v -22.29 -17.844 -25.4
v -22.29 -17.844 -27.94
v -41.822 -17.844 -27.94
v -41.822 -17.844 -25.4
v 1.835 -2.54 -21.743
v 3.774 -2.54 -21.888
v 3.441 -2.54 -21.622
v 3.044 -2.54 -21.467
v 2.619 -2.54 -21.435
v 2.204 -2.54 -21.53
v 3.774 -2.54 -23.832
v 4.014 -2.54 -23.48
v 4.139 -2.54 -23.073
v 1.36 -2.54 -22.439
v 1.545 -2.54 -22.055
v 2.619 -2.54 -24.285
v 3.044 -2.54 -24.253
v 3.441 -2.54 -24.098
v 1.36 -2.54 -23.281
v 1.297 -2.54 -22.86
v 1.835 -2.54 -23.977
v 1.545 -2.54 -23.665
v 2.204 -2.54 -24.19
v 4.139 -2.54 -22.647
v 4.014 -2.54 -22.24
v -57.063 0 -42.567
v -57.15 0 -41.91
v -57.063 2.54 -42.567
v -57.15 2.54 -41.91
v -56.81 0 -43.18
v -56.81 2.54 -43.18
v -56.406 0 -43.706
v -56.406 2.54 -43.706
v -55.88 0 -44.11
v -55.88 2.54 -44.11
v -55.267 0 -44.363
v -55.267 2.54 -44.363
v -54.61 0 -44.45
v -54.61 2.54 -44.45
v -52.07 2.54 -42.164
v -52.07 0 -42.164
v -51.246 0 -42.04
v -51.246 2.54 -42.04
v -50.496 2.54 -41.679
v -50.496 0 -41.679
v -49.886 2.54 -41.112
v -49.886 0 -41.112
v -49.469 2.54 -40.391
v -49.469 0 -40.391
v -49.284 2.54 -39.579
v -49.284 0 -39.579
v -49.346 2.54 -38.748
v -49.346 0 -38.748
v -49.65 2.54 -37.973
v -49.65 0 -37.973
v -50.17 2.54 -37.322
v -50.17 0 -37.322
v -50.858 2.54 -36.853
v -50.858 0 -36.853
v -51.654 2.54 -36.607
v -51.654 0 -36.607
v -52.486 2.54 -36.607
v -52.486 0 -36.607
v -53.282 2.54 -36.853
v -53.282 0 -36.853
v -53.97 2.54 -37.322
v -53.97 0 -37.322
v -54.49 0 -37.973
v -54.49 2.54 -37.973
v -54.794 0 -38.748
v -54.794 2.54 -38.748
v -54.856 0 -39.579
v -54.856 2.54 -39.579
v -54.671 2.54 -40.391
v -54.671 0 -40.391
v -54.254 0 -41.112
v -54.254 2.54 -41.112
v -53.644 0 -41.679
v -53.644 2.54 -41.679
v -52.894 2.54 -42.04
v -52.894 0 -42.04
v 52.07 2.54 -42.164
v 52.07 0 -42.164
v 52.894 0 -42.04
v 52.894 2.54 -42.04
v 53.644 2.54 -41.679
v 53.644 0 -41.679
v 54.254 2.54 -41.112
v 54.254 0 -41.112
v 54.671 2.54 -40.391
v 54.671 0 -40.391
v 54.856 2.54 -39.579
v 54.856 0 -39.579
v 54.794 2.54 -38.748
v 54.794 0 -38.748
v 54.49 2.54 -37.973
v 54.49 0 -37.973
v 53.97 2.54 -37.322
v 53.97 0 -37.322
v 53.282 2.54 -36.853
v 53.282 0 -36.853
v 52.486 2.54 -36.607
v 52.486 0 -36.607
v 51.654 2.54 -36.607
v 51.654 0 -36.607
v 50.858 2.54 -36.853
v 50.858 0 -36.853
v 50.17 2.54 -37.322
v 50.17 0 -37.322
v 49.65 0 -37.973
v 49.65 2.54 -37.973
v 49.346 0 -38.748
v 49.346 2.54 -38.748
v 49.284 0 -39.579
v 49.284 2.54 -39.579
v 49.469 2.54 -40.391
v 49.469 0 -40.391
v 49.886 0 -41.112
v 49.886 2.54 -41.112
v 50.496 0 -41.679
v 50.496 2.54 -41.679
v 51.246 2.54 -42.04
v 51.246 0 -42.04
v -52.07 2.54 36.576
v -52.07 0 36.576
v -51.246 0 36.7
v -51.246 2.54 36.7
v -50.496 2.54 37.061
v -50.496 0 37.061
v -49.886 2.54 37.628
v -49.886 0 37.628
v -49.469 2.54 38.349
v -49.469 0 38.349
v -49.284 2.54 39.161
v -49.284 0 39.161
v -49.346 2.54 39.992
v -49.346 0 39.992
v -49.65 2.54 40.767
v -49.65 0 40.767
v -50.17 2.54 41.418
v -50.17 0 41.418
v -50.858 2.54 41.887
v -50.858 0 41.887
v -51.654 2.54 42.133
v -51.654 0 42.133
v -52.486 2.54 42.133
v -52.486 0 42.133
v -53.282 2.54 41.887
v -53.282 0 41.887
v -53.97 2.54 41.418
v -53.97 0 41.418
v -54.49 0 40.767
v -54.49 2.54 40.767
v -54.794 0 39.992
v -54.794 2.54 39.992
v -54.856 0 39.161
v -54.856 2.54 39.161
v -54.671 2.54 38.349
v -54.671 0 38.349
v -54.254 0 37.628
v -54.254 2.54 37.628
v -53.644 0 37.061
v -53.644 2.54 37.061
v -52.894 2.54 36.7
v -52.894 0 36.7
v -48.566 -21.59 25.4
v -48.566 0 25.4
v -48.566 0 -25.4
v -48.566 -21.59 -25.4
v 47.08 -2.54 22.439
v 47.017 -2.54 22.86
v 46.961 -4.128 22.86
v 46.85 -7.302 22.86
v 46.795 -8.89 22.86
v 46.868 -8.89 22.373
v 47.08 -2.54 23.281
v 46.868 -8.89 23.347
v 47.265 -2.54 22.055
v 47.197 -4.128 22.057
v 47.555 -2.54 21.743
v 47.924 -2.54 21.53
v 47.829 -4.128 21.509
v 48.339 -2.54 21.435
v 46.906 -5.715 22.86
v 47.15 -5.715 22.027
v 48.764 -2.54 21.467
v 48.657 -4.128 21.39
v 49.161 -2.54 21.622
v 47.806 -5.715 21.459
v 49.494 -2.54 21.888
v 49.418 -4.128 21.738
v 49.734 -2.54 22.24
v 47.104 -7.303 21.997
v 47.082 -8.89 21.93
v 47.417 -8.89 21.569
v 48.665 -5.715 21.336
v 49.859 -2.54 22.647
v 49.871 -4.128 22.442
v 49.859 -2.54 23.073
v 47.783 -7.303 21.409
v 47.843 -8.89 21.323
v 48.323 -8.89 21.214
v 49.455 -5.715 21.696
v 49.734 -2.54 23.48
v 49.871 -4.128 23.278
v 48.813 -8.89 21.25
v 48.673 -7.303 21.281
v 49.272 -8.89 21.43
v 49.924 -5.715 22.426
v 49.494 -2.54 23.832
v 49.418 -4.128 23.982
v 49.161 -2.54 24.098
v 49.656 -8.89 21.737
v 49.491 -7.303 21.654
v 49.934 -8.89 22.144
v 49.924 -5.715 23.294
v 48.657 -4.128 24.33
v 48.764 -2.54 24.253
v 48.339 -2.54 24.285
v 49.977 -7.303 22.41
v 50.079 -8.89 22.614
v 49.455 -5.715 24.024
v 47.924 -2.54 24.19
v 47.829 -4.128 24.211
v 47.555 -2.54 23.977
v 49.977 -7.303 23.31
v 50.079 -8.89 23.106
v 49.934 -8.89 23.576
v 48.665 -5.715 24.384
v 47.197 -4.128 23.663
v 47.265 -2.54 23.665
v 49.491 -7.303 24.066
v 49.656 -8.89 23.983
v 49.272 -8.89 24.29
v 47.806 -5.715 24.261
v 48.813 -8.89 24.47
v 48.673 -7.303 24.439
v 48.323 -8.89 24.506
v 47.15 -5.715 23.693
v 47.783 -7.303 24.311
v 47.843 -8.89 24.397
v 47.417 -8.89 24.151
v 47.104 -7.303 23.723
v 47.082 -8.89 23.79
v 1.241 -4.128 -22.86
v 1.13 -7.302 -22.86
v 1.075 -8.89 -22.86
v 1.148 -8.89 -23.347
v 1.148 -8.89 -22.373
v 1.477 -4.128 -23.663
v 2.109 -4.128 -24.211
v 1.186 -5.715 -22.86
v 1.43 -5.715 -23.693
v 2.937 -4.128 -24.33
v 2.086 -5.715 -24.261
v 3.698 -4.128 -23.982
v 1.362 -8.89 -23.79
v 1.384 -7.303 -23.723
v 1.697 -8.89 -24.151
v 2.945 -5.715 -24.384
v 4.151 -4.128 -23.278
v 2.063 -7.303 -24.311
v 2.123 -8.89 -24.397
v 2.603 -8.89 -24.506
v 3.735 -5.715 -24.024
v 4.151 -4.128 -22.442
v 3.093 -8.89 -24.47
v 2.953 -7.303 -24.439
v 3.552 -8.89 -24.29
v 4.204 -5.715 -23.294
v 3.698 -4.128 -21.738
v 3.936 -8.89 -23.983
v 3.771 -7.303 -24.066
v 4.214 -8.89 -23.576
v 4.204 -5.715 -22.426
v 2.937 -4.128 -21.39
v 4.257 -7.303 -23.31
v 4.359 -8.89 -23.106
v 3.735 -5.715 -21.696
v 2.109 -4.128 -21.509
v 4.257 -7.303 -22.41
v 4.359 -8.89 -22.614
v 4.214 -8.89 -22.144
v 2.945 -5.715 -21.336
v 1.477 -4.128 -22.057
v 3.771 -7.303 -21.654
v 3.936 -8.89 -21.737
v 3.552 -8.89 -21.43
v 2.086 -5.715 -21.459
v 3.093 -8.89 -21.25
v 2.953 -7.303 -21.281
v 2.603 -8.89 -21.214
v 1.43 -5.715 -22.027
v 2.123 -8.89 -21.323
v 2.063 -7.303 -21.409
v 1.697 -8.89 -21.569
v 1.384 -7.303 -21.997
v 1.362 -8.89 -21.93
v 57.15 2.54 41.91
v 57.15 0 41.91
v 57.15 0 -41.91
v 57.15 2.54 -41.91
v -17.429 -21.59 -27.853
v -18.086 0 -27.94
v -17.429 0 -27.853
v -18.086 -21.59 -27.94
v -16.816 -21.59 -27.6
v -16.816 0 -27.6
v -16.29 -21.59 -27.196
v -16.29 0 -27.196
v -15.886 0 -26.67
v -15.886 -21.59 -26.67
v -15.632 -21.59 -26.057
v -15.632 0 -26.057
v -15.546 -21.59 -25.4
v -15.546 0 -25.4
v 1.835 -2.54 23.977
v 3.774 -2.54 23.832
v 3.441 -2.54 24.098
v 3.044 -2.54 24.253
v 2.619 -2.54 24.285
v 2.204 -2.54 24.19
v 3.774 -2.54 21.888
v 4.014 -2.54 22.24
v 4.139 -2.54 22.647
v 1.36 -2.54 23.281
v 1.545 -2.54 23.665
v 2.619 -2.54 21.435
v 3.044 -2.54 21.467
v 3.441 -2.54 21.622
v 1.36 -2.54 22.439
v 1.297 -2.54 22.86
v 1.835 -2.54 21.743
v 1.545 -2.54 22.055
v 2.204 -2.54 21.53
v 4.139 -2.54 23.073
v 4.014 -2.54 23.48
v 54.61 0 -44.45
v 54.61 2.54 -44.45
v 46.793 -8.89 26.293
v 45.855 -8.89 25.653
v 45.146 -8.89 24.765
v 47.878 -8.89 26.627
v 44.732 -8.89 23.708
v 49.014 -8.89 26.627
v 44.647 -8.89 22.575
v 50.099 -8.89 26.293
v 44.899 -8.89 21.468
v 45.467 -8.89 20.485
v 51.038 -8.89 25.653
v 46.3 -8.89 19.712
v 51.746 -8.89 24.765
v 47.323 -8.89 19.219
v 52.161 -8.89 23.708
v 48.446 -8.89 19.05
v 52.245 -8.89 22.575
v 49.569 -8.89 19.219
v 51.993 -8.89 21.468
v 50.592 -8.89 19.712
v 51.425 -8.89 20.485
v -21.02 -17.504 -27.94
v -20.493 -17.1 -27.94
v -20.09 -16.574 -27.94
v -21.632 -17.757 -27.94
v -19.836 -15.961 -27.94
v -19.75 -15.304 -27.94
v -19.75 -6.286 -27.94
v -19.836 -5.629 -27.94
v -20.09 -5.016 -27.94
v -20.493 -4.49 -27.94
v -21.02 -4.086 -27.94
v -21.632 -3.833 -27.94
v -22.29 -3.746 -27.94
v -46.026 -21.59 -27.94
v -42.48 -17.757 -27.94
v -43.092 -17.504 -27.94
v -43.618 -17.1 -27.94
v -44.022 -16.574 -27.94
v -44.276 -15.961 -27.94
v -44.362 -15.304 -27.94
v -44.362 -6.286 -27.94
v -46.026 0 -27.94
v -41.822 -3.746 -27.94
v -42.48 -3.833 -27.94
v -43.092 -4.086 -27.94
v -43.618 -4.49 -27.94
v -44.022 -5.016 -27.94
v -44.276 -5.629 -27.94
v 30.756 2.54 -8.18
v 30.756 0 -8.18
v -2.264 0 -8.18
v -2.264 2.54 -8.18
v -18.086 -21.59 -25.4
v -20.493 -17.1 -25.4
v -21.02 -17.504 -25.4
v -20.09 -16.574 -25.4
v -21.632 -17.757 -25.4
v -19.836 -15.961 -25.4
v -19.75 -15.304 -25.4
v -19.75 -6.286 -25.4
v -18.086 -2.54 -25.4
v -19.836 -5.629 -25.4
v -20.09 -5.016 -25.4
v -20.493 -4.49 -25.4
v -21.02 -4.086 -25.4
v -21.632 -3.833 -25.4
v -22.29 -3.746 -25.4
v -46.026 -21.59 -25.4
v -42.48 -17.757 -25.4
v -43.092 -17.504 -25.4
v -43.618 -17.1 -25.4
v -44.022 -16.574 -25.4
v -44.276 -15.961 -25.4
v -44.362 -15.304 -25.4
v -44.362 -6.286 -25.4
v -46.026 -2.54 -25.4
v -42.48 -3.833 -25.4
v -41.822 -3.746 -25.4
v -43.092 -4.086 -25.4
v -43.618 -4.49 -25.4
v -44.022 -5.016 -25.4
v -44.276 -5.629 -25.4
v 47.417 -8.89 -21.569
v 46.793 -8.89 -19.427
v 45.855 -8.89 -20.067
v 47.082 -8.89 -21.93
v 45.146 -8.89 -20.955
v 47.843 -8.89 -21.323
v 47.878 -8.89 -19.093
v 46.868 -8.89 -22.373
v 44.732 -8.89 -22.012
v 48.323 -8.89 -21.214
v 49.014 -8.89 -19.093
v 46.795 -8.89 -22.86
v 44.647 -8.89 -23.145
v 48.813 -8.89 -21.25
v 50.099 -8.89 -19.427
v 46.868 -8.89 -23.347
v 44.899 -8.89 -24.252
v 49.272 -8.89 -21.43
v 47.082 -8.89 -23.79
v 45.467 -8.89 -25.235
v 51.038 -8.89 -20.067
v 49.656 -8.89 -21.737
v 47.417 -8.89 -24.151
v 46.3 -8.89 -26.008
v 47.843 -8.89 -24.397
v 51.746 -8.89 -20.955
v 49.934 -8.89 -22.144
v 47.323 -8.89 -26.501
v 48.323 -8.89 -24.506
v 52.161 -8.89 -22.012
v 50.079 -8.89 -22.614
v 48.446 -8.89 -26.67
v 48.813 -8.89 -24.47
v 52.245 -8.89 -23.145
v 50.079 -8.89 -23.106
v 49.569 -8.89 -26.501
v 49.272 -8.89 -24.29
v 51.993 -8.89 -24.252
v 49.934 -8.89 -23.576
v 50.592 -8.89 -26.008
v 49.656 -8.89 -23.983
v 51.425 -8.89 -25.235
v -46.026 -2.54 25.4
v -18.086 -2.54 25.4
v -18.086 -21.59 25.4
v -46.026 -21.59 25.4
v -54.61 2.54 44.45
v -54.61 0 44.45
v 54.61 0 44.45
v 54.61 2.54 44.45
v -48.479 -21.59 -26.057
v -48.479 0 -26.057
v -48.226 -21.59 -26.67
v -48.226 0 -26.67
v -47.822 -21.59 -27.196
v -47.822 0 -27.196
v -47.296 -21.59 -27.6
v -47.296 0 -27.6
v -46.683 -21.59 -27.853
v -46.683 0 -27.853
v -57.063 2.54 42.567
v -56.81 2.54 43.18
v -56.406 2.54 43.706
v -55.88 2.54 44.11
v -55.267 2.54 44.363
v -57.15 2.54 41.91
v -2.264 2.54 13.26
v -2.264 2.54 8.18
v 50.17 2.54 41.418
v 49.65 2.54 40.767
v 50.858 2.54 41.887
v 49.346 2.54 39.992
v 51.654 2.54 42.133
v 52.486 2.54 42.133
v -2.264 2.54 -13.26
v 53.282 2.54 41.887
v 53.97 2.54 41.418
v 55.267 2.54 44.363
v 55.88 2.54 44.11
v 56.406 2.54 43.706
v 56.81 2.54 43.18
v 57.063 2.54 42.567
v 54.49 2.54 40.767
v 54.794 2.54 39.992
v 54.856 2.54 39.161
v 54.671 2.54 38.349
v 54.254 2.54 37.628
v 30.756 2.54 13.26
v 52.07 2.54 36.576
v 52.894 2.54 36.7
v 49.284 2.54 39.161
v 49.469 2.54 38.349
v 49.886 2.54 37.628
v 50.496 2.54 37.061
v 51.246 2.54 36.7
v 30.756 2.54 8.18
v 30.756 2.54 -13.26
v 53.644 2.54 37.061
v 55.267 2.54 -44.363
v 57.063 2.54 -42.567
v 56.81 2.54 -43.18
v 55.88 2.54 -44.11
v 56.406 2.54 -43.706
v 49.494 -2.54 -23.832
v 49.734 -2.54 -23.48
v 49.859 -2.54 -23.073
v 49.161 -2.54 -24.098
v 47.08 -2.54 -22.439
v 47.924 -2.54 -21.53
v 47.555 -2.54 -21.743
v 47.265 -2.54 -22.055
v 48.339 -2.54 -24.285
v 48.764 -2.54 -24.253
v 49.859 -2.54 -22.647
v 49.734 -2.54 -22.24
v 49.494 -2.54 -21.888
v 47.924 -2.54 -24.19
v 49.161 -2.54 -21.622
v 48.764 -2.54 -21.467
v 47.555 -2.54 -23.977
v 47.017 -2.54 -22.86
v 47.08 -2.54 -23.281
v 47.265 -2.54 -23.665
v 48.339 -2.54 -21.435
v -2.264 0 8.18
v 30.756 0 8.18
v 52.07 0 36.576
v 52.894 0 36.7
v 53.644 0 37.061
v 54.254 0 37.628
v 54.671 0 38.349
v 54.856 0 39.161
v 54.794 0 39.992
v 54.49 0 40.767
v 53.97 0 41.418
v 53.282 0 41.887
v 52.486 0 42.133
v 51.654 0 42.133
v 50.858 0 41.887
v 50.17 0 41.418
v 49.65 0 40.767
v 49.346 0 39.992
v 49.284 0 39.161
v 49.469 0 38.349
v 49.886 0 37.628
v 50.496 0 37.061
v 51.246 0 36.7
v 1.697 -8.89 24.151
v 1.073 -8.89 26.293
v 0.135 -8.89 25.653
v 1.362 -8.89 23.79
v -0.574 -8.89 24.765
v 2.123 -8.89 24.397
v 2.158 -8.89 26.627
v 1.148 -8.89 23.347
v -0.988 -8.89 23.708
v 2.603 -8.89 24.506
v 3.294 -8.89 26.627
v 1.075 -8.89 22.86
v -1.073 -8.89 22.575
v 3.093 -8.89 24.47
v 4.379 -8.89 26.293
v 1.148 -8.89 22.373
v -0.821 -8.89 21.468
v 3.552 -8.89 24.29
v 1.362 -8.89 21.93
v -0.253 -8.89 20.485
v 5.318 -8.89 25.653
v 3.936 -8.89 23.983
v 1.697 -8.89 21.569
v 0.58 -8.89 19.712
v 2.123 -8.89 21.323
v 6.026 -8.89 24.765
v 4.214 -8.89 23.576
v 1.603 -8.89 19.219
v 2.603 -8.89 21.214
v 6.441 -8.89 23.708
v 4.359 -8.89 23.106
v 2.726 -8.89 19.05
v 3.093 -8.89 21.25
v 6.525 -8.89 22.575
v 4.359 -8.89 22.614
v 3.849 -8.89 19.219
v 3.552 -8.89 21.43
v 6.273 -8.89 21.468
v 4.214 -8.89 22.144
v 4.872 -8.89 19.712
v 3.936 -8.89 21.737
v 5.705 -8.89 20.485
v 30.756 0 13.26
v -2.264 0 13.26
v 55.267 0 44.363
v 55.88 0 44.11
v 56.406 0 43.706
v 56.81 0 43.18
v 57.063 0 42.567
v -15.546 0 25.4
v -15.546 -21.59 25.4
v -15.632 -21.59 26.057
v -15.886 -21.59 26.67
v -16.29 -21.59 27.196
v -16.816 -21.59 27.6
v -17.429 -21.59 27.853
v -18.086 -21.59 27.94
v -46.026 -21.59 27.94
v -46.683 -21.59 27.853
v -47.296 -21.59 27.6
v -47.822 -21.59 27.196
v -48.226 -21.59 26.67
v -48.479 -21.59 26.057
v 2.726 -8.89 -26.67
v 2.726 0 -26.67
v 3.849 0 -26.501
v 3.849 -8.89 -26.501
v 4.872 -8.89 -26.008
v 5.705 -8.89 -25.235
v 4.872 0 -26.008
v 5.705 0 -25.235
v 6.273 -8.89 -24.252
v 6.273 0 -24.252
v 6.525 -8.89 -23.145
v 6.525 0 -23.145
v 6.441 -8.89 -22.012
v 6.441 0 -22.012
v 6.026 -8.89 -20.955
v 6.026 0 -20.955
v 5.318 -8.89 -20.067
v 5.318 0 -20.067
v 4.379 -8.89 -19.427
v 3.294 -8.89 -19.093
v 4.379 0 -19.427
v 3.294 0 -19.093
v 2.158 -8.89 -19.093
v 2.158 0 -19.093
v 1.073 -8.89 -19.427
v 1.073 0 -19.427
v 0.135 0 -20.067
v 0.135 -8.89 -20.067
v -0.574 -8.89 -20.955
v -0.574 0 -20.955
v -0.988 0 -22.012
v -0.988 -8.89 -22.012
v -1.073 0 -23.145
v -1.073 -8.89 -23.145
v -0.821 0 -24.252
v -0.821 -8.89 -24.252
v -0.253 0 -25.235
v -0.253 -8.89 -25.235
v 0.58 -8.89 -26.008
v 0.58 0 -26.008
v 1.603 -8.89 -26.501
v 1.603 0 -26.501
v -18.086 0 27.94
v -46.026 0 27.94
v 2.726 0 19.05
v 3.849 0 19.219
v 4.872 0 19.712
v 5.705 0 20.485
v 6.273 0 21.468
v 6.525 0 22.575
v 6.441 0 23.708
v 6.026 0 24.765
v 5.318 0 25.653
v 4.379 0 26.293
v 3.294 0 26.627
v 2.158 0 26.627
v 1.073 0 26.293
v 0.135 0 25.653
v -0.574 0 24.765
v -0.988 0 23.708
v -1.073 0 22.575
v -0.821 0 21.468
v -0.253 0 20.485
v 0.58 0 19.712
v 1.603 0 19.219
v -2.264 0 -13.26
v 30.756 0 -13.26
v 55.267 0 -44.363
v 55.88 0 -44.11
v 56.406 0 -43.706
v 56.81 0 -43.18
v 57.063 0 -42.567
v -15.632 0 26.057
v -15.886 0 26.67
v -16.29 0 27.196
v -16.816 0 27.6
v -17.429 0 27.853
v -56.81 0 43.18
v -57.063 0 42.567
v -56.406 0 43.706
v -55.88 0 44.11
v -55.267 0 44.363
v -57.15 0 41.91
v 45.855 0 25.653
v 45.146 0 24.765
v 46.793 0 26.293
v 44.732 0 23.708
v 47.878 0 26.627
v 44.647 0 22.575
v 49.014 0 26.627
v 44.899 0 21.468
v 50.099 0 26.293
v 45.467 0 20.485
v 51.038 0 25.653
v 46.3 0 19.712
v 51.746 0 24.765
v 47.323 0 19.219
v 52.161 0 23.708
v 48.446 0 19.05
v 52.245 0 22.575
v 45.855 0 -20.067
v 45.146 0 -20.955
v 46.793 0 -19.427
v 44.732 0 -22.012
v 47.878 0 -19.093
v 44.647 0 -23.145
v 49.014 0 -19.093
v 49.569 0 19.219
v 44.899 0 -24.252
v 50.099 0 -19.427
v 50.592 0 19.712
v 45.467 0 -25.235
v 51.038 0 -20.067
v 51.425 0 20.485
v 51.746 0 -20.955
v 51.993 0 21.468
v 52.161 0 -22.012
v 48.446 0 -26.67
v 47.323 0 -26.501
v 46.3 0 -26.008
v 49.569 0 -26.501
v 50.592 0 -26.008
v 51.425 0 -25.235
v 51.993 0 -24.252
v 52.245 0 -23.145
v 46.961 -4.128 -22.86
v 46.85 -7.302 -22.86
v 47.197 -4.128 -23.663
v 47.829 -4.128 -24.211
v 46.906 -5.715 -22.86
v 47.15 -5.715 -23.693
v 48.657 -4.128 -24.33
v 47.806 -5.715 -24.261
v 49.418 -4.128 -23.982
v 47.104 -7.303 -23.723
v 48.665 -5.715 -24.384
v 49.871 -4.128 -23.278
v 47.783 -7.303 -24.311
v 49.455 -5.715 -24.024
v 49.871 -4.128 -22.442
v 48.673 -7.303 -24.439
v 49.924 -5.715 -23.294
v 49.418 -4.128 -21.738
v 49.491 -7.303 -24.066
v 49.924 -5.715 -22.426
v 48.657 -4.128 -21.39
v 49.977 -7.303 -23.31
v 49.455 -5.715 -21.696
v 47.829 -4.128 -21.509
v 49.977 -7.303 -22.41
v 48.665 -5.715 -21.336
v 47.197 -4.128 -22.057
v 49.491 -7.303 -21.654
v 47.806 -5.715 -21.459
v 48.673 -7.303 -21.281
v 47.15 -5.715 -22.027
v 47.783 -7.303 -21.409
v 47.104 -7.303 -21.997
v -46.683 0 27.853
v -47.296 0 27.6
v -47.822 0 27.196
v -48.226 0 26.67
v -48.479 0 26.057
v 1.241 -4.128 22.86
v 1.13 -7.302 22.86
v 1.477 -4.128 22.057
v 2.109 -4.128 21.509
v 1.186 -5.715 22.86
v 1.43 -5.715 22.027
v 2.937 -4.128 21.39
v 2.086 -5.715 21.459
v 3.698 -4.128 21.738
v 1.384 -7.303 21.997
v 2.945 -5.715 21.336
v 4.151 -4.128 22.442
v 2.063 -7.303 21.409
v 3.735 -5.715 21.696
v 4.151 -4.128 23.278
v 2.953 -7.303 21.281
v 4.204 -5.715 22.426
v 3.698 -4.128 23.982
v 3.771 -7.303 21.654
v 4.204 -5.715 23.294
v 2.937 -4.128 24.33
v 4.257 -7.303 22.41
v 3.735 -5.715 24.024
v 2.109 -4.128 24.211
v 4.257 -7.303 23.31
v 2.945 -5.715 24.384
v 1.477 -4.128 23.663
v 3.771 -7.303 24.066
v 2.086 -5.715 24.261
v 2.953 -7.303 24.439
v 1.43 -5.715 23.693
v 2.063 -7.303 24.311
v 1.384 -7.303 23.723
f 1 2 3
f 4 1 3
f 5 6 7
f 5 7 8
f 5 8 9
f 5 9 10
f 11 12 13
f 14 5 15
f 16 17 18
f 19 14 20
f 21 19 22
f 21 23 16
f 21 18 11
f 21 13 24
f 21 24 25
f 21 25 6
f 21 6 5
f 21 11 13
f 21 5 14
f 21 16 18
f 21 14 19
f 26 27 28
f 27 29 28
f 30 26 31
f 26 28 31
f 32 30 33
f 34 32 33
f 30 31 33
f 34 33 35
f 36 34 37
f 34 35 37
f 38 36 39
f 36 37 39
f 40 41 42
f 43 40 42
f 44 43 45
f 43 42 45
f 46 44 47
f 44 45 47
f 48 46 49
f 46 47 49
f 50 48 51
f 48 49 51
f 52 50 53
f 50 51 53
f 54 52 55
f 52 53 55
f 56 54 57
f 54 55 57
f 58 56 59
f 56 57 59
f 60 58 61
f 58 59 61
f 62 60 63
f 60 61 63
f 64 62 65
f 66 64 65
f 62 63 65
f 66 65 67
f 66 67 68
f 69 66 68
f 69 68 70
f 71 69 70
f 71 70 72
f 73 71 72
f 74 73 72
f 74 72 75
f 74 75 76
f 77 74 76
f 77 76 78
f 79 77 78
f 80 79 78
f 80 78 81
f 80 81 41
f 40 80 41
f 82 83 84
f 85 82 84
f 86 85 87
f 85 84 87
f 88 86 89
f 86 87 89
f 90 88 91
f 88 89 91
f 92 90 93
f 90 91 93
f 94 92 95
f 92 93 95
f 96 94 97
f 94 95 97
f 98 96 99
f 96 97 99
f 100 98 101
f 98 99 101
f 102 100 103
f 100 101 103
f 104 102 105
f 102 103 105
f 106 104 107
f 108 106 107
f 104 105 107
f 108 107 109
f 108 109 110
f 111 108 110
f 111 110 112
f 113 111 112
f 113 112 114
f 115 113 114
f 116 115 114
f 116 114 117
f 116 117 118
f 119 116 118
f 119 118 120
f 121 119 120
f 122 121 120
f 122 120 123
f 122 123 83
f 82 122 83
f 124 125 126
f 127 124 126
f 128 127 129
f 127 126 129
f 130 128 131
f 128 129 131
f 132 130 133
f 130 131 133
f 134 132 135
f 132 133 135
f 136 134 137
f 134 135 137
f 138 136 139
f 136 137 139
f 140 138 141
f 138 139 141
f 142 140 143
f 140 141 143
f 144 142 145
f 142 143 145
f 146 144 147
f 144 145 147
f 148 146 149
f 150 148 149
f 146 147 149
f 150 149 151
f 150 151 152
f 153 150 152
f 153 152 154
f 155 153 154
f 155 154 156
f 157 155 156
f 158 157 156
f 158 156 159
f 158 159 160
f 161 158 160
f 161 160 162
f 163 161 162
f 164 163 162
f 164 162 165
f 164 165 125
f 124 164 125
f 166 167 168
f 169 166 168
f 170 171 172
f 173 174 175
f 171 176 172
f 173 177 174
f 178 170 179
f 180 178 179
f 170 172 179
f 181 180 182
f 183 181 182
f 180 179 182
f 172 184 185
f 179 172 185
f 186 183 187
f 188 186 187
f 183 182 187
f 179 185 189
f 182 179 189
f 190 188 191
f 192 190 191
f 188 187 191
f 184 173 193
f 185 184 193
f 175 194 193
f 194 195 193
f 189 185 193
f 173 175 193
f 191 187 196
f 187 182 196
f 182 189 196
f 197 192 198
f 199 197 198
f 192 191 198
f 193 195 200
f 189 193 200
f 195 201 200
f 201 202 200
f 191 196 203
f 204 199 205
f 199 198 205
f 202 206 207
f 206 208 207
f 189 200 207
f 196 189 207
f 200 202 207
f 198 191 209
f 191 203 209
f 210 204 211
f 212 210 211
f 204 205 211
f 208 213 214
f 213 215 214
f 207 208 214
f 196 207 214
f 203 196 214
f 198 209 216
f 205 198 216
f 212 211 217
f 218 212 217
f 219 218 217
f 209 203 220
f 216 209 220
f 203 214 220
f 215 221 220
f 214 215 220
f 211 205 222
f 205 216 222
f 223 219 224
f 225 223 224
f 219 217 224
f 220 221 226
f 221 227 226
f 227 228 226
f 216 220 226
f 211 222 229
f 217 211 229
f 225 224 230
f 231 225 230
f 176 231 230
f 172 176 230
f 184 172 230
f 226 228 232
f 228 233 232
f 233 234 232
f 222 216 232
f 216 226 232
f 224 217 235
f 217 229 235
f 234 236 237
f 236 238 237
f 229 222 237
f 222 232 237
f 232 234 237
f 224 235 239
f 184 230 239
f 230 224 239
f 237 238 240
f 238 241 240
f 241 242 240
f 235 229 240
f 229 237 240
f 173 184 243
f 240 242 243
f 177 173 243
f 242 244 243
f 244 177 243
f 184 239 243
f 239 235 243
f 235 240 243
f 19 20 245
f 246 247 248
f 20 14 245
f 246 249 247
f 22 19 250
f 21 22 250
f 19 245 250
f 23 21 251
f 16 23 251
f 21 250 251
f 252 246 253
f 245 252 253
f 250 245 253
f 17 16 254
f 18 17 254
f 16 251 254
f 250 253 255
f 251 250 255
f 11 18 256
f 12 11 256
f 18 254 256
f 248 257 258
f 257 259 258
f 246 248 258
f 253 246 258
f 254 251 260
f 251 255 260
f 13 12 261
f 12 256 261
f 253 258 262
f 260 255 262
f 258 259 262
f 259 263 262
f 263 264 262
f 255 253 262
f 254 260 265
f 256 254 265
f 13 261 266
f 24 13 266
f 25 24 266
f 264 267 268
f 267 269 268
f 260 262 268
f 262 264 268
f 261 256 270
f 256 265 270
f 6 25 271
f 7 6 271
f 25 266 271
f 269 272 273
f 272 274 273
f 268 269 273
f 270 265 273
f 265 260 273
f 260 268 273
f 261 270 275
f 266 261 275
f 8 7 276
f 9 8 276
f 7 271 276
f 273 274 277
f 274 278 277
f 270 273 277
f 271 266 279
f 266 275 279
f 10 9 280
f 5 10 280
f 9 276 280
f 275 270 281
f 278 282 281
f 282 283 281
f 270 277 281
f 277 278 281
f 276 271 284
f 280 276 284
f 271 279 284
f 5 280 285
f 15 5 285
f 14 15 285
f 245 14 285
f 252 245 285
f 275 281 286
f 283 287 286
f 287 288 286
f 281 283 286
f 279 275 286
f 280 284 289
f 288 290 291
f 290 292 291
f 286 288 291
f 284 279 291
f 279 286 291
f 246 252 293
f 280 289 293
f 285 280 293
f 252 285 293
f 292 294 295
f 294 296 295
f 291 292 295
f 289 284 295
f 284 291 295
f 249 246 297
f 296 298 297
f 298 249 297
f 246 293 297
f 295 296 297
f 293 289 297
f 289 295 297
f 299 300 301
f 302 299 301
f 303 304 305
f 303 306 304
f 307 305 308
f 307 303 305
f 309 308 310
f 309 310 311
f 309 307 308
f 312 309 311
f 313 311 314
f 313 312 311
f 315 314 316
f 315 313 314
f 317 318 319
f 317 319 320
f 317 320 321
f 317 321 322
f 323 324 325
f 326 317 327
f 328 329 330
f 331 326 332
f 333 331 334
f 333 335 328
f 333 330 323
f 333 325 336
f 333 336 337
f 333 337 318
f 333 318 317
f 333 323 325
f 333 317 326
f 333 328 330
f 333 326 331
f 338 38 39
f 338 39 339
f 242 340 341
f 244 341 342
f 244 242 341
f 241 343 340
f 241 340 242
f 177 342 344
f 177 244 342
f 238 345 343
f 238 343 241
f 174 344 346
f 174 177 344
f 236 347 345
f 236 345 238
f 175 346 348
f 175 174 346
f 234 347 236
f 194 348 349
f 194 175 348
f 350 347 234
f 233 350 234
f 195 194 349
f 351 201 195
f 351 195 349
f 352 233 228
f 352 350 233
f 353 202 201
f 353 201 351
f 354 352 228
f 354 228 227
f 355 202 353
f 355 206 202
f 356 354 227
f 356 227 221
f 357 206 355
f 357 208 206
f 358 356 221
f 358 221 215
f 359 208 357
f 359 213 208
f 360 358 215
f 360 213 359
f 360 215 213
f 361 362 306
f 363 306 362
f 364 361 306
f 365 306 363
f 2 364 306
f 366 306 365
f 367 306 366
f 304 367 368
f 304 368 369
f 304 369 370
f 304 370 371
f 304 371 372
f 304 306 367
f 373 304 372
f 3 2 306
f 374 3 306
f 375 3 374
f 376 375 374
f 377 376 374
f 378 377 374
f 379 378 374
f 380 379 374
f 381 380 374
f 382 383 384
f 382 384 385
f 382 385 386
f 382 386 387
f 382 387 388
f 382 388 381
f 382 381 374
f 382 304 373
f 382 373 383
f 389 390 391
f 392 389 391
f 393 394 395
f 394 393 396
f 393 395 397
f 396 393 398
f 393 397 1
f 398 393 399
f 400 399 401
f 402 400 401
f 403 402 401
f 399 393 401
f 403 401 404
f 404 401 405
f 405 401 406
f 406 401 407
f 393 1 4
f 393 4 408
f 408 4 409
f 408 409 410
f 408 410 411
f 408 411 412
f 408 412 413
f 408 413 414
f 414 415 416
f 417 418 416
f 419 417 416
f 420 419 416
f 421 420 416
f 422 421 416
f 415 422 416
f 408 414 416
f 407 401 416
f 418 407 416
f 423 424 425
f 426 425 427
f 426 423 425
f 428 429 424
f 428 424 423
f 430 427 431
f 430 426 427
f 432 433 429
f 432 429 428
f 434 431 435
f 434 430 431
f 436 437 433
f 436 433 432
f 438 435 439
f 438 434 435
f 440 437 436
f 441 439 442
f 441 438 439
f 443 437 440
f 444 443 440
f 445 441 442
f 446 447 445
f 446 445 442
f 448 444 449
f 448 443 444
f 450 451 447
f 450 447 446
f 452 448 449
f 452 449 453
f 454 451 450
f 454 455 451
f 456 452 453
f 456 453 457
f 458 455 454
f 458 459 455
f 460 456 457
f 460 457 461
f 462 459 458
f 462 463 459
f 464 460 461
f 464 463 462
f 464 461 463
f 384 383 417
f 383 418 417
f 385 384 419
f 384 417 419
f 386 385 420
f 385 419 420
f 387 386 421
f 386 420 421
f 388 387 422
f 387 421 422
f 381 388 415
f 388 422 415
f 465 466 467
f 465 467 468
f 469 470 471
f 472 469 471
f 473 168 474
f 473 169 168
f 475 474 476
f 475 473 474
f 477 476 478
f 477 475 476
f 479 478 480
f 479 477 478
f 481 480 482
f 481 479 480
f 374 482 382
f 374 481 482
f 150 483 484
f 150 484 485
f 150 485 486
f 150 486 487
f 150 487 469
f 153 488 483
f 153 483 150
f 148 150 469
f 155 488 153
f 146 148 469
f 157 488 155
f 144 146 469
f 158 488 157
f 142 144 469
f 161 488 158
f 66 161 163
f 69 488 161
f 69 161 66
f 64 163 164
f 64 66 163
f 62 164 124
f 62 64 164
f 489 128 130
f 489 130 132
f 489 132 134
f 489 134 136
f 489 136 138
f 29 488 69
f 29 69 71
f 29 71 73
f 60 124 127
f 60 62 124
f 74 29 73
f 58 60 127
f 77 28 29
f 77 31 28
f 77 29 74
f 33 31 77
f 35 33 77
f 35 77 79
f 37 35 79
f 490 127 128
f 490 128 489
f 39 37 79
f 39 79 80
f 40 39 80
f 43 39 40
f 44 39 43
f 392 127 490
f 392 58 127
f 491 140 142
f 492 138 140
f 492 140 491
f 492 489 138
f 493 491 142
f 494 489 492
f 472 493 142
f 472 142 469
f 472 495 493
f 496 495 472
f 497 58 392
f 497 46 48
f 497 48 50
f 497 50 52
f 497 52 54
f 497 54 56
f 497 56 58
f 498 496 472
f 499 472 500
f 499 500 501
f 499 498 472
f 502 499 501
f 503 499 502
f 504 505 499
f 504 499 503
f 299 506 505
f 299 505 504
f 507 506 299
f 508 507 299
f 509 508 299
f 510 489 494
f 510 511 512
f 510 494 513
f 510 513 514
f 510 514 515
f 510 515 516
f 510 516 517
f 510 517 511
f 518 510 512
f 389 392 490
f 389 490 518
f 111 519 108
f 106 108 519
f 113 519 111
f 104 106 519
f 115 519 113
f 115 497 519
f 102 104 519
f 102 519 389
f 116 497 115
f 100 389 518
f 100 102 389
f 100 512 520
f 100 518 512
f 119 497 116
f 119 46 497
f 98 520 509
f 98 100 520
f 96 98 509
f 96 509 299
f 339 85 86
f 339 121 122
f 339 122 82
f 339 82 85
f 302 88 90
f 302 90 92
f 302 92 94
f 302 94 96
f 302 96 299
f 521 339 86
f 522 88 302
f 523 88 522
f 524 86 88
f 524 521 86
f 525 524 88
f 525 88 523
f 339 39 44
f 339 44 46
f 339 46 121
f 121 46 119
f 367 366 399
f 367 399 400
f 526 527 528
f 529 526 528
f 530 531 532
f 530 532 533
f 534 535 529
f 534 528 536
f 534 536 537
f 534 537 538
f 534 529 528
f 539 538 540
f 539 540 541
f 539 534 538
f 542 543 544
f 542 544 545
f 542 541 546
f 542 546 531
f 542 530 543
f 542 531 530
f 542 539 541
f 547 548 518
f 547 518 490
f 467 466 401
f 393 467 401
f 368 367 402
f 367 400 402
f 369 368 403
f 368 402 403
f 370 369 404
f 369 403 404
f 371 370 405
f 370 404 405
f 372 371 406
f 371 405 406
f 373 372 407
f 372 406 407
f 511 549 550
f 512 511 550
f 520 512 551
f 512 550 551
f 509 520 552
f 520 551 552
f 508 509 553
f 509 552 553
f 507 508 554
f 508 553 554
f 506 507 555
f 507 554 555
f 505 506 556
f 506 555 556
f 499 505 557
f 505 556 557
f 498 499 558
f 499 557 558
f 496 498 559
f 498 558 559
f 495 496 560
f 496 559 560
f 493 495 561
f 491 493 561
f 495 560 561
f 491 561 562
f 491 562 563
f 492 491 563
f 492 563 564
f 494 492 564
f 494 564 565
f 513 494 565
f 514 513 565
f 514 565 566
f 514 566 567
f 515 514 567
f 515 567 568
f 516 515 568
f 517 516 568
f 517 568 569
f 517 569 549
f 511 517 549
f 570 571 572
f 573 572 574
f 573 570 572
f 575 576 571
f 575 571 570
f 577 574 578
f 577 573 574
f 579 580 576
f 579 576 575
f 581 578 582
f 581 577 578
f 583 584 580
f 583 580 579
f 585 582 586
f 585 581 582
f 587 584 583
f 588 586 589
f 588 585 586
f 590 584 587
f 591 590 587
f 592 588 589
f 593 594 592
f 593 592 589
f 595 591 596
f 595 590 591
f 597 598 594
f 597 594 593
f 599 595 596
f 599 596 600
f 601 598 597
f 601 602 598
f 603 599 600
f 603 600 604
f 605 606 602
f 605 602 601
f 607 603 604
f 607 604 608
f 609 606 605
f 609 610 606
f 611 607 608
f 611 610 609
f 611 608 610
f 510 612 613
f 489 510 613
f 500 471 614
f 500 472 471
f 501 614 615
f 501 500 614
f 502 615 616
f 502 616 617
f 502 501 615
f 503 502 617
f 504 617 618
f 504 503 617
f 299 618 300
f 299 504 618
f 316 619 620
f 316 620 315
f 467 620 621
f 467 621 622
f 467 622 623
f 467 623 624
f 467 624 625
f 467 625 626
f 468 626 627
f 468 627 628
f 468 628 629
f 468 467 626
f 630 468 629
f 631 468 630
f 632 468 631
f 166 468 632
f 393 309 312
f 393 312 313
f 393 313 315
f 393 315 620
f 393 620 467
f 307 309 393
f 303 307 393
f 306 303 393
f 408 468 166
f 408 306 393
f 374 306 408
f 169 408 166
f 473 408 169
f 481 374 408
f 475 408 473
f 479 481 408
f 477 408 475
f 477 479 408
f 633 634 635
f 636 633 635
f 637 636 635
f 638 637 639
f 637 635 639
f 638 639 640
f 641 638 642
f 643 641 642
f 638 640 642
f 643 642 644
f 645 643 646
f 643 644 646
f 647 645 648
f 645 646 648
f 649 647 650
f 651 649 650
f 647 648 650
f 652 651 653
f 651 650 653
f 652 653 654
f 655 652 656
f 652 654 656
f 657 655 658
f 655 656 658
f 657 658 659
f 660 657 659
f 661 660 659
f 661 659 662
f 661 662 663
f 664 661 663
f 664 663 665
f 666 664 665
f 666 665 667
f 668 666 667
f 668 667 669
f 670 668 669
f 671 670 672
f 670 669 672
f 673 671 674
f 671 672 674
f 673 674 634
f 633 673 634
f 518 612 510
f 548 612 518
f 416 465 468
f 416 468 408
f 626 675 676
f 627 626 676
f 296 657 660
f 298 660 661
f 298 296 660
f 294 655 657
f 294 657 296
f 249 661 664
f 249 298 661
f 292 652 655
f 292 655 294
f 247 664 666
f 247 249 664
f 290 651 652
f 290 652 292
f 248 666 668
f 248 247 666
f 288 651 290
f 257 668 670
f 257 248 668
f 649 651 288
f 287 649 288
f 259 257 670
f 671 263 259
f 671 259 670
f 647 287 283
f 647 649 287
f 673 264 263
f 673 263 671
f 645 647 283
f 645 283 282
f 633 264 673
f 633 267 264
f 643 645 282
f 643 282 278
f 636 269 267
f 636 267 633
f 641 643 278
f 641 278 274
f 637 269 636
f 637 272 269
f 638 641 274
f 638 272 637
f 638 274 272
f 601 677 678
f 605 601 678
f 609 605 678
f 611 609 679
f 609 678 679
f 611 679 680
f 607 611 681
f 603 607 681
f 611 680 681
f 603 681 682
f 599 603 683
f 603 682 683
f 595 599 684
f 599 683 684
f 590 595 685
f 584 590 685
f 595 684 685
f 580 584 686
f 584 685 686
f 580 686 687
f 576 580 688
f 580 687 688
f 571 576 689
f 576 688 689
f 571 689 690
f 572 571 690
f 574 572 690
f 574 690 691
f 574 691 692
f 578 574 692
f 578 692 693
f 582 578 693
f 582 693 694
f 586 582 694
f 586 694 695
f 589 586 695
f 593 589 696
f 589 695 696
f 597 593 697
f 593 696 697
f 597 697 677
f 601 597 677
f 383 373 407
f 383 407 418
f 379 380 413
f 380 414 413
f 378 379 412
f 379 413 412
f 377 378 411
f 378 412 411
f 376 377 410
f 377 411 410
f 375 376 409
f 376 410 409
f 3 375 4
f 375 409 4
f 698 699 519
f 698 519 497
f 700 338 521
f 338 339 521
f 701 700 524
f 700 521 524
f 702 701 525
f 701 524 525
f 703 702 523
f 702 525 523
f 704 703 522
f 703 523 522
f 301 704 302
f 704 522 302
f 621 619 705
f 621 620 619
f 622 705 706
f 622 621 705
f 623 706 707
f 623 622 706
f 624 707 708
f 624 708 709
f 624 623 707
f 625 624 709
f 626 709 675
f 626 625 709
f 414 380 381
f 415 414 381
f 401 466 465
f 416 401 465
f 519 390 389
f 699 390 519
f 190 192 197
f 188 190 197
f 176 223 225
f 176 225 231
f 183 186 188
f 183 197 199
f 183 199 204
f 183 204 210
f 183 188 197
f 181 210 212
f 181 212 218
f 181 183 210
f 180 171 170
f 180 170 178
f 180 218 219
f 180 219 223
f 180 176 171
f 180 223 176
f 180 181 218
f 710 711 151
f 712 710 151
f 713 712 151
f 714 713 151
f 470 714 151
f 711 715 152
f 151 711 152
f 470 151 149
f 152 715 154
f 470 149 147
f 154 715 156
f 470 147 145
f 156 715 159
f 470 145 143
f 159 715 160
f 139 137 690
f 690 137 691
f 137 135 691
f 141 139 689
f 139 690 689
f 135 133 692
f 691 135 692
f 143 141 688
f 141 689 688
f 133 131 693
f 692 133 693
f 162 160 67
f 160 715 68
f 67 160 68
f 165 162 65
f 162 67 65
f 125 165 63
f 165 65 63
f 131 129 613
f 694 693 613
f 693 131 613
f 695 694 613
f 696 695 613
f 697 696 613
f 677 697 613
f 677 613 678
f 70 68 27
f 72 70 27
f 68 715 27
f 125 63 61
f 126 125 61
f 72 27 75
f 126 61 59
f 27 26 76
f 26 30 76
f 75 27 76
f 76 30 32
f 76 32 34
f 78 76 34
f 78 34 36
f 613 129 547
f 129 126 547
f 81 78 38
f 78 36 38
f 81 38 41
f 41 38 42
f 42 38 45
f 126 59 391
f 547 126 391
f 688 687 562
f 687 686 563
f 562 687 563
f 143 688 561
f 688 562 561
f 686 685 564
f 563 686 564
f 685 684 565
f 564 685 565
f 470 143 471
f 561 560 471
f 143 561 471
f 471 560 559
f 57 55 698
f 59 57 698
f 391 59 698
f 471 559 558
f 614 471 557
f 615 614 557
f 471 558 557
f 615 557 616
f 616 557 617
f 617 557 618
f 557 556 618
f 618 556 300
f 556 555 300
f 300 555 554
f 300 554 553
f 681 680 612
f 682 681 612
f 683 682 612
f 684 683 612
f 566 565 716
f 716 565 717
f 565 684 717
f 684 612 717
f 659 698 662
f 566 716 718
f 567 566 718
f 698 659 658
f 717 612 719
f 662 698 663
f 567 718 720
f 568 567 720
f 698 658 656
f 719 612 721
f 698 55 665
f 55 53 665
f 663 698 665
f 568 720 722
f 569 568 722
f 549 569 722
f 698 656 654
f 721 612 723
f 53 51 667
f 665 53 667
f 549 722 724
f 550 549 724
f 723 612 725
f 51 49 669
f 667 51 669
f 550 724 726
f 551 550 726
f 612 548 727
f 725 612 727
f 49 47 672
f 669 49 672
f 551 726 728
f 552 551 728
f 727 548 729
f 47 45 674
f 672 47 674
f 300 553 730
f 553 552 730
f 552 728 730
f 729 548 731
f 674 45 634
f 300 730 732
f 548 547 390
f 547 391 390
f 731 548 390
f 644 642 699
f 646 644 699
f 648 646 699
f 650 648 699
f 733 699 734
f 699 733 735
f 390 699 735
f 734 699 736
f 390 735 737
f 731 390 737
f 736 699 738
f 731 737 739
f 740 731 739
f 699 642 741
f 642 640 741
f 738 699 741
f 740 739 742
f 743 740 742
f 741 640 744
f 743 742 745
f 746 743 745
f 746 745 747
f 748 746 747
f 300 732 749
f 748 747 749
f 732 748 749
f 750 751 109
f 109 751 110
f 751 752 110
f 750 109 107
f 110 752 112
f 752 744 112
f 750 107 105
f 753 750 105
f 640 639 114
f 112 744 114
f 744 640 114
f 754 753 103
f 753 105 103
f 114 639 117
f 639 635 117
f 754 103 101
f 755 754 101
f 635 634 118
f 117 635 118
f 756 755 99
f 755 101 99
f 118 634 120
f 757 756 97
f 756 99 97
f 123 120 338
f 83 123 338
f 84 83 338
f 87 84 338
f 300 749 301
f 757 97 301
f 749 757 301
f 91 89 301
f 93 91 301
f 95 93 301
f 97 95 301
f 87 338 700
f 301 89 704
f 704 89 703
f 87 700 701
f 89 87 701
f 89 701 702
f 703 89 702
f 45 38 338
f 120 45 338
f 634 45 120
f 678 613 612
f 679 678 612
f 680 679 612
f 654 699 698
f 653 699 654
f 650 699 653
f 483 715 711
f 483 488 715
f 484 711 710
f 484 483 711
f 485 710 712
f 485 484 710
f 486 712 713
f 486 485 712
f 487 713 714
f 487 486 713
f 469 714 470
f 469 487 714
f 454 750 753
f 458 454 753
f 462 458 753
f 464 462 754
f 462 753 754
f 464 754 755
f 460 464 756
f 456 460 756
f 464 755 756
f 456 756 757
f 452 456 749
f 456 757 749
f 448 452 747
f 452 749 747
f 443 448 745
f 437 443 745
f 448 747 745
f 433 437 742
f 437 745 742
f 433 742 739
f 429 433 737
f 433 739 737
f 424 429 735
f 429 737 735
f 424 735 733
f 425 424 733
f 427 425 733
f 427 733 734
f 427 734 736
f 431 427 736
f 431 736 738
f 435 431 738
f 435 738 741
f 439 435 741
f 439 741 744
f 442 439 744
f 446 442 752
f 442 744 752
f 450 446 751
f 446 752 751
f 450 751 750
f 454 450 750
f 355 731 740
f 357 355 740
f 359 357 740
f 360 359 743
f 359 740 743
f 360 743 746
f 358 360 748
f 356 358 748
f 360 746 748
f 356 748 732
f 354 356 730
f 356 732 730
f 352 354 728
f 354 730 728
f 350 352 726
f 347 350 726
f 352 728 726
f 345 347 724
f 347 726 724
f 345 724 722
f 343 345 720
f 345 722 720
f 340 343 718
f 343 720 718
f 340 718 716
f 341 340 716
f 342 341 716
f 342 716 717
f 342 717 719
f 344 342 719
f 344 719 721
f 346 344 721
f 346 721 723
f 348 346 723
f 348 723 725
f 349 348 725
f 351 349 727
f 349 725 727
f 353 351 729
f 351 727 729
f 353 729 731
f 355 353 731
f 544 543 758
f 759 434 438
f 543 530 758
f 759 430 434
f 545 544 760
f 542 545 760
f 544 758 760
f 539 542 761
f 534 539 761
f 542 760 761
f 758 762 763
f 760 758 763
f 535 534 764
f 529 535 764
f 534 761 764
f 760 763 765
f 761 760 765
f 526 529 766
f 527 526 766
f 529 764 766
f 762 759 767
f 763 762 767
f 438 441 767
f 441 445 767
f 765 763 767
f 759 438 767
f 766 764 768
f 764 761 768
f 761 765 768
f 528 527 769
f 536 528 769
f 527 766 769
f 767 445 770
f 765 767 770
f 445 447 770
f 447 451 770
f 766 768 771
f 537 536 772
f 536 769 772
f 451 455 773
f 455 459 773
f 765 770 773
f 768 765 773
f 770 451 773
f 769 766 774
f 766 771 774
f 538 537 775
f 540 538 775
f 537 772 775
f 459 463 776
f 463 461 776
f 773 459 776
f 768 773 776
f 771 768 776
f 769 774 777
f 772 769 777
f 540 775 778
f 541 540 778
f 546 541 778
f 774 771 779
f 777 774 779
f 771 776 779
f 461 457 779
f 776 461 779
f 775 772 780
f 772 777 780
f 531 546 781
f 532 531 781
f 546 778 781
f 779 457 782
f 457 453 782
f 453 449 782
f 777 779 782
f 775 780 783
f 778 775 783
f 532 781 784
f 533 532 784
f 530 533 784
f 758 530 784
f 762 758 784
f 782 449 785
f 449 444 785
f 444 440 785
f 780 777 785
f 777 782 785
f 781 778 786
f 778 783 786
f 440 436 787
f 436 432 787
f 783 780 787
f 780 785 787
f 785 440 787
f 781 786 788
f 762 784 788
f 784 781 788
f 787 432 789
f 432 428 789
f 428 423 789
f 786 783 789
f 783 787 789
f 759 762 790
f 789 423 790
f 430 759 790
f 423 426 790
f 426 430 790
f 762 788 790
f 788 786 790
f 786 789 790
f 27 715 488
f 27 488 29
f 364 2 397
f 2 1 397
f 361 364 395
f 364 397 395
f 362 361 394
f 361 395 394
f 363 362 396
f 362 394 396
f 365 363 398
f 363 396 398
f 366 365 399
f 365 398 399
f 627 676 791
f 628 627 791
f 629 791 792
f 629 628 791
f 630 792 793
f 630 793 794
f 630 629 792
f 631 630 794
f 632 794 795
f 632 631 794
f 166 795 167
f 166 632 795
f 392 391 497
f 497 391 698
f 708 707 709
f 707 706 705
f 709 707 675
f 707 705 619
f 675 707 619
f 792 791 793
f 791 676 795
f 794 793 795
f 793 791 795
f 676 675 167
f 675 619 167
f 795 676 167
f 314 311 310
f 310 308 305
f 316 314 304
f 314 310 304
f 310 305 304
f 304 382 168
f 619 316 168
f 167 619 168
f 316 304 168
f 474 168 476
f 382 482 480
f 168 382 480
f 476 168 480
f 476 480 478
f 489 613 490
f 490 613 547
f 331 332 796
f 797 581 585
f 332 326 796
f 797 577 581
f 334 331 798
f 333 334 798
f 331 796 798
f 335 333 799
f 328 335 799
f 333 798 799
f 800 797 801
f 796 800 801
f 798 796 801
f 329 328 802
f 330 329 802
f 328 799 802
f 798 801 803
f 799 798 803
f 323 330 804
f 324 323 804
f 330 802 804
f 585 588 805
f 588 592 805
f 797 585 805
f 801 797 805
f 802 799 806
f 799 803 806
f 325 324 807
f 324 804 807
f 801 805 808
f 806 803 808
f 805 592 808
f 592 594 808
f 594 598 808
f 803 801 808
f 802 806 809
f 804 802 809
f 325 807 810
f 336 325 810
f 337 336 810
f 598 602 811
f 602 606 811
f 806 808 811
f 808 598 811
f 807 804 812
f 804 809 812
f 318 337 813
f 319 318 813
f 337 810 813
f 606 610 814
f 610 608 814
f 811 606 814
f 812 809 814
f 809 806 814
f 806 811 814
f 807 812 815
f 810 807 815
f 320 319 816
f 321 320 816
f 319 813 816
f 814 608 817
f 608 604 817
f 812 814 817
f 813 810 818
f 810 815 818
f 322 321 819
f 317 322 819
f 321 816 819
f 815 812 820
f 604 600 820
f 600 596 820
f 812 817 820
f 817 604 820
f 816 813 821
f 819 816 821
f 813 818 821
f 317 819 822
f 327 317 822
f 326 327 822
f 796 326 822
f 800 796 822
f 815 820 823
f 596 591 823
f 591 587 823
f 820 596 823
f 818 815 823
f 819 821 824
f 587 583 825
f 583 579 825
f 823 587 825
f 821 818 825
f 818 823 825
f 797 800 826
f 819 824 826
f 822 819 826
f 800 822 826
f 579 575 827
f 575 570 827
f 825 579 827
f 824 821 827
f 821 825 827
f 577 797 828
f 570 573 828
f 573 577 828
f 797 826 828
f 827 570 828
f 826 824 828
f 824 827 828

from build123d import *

# Parameters (mm, degrees)
SKETCH1_W                    = 114.3
SKETCH1_H                    = 88.9
BOSS_EXTRUDE2_DEPTH          = 2.54
SKETCH2_R                    = 2.794
CUT_EXTRUDE1_DEPTH           = 5.08
SKETCH9_W                    = 33.02
SKETCH9_H                    = 5.08
CUT_EXTRUDE5_DEPTH           = 6.35
SKETCH8_W                    = 33.02
SKETCH8_H                    = 55.88
BOSS_EXTRUDE4_DEPTH          = 21.59
SHELL4_T                     = -2.54
SKETCH13_W                   = 24.612851837
SKETCH13_H                   = 14.097856124
CUT_EXTRUDE6_DEPTH           = 5.08
FILLET5_R                    = 2.54
FILLET6_R                    = 2.54
FILLET7_R                    = 2.54
FILLET8_R                    = 2.54
FILLET1_R                    = 2.54
FILLET2_R                    = 2.54
FILLET3_R                    = 2.54
FILLET4_R                    = 2.54
SKETCH3_R                    = 3.81
BOSS_EXTRUDE5_DEPTH          = 8.89
SKETCH15_R                   = 1.651
CUT_EXTRUDE7_DEPTH           = 6.35
CUT_EXTRUDE7_DRAFT           = -2
CUT_EXTRUDE7_PROFILE_2_DEPTH = 6.35
CUT_EXTRUDE7_PROFILE_2_DRAFT = -2
CUT_EXTRUDE7_PROFILE_3_DEPTH = 6.35
CUT_EXTRUDE7_PROFILE_3_DRAFT = -2
CUT_EXTRUDE7_PROFILE_4_DEPTH = 6.35
CUT_EXTRUDE7_PROFILE_4_DRAFT = -2
FILLET9_R                    = 2.54
FILLET10_R                   = 2.54
FILLET11_R                   = 2.54
FILLET12_R                   = 2.54


with BuildPart() as part:
    # Sketch1 → Boss-Extrude2 (new body)
    with BuildSketch(Plane(origin=(0, 0, 0), x_dir=(1, 0, 0), z_dir=(0, 1, 0))):
        Rectangle(SKETCH1_W, SKETCH1_H)
    extrude(amount=BOSS_EXTRUDE2_DEPTH)

    # Sketch2 → Cut-Extrude1 (cut)
    with BuildSketch(Plane(origin=(0, 0, 0), x_dir=(-1, 0, 0), z_dir=(0, -1, 0))):
        with Locations(Location((52.07, 39.37, 0), (0, 0, 90))):
            Circle(SKETCH2_R)
        with Locations(Location((52.07, -39.37, 0), (0, 0, 90))):
            Circle(SKETCH2_R)
        with Locations(Location((-52.07, -39.37, 0), (0, 0, 90))):
            Circle(SKETCH2_R)
        with Locations(Location((-52.07, 39.37, 0), (0, 0, 90))):
            Circle(SKETCH2_R)
    extrude(amount=-CUT_EXTRUDE1_DEPTH, mode=Mode.SUBTRACT)

    # Sketch9 → Cut-Extrude5 (cut)
    with BuildSketch(Plane(origin=(0, 0, 0), x_dir=(-1, 0, 0), z_dir=(0, -1, 0))):
        with Locations((-14.245526461, -10.719909337)):
            Rectangle(SKETCH9_W, SKETCH9_H)
        with Locations((-14.245526461, 10.719909337)):
            Rectangle(SKETCH9_W, SKETCH9_H)
    extrude(amount=-CUT_EXTRUDE5_DEPTH, mode=Mode.SUBTRACT)

    # Fillet1
    fillet1_edges = [part.edges().sort_by_distance(p)[0] for p in [
        (57.15, 1.27, 44.45),
    ]]
    fillet(fillet1_edges, radius=FILLET1_R)

    # Fillet2
    fillet2_edges = [part.edges().sort_by_distance(p)[0] for p in [
        (-57.15, 1.27, -44.45),
    ]]
    fillet(fillet2_edges, radius=FILLET2_R)

    # Fillet3
    fillet3_edges = [part.edges().sort_by_distance(p)[0] for p in [
        (-57.15, 1.27, 44.45),
    ]]
    fillet(fillet3_edges, radius=FILLET3_R)

    # Fillet4
    fillet4_edges = [part.edges().sort_by_distance(p)[0] for p in [
        (57.15, 1.27, -44.45),
    ]]
    fillet(fillet4_edges, radius=FILLET4_R)

    # Sketch3 → Boss-Extrude5 (add)
    with BuildSketch(Plane(origin=(0, 0, 0), x_dir=(-1, 0, 0), z_dir=(0, -1, 0))):
        with Locations(Location((-2.726054499, -22.86, 0), (0, 0, 90))):
            Circle(SKETCH3_R)
        with Locations(Location((-48.446054499, -22.86, 0), (0, 0, 90))):
            Circle(SKETCH3_R)
        with Locations(Location((-48.446054499, 22.86, 0), (0, 0, 90))):
            Circle(SKETCH3_R)
        with Locations(Location((-2.726054499, 22.86, 0), (0, 0, 90))):
            Circle(SKETCH3_R)
    extrude(amount=BOSS_EXTRUDE5_DEPTH)


with BuildPart() as body_2:
    # Sketch8 → Boss-Extrude4 (new body)
    with BuildSketch(Plane(origin=(0, 0, 0), x_dir=(-1, 0, 0), z_dir=(0, -1, 0))):
        with Locations((32.055940653, 0)):
            Rectangle(SKETCH8_W, SKETCH8_H)
    extrude(amount=BOSS_EXTRUDE4_DEPTH)

    # Shell4
    shell4_openings = [body_2.faces().sort_by_distance(p)[0] for p in [
        (-32.055940653, -21.59, 0),
    ]]
    offset(amount=SHELL4_T, openings=shell4_openings, kind=Kind.INTERSECTION)

    # Sketch13 → Cut-Extrude6 (cut)
    with BuildSketch(Plane(origin=(0, 0, -27.94), x_dir=(-1, 0, 0), z_dir=(0, 0, -1))):
        with Locations((32.055940652, -10.795)):
            Rectangle(SKETCH13_W, SKETCH13_H)
    extrude(amount=-CUT_EXTRUDE6_DEPTH, mode=Mode.SUBTRACT)

    # Fillet5
    fillet5_edges = [body_2.edges().sort_by_distance(p)[0] for p in [
        (-19.749514734, -17.843928062, -26.67),
    ]]
    fillet(fillet5_edges, radius=FILLET5_R)

    # Fillet6
    fillet6_edges = [body_2.edges().sort_by_distance(p)[0] for p in [
        (-19.749514734, -3.746071938, -26.67),
    ]]
    fillet(fillet6_edges, radius=FILLET6_R)

    # Fillet7
    fillet7_edges = [body_2.edges().sort_by_distance(p)[0] for p in [
        (-44.362366571, -3.746071938, -26.67),
    ]]
    fillet(fillet7_edges, radius=FILLET7_R)

    # Fillet8
    fillet8_edges = [body_2.edges().sort_by_distance(p)[0] for p in [
        (-44.362366571, -17.843928062, -26.67),
    ]]
    fillet(fillet8_edges, radius=FILLET8_R)

    # Fillet9
    fillet9_edges = [body_2.edges().sort_by_distance(p)[0] for p in [
        (-15.545940653, -10.795, -27.94),
    ]]
    fillet(fillet9_edges, radius=FILLET9_R)

    # Fillet10
    fillet10_edges = [body_2.edges().sort_by_distance(p)[0] for p in [
        (-15.545940653, -10.795, 27.94),
    ]]
    fillet(fillet10_edges, radius=FILLET10_R)

    # Fillet11
    fillet11_edges = [body_2.edges().sort_by_distance(p)[0] for p in [
        (-48.565940653, -10.795, 27.94),
    ]]
    fillet(fillet11_edges, radius=FILLET11_R)

    # Fillet12
    fillet12_edges = [body_2.edges().sort_by_distance(p)[0] for p in [
        (-48.565940653, -10.795, -27.94),
    ]]
    fillet(fillet12_edges, radius=FILLET12_R)


with BuildPart() as cut_extrude7_tool:
    # Sketch15 → Cut-Extrude7 (with draft: the straight prism first)
    with BuildSketch(Plane(origin=(0, -8.89, 0), x_dir=(-1, 0, 0), z_dir=(0, -1, 0))):
        with Locations((-48.446054499, -22.86)):
            Circle(SKETCH15_R)
    extrude(amount=-CUT_EXTRUDE7_DEPTH)
    # Cut-Extrude7: the draft: its side faces are tilted about the plane it starts from
    cut_extrude7_sides = [cut_extrude7_tool.faces().sort_by_distance(p)[0] for p in [
        (50.097054499, -5.715, 22.86),
    ]]
    draft(cut_extrude7_sides, Plane(origin=(0, -8.89, 0), x_dir=(-1, 0, 0), z_dir=(0, -1, 0)), CUT_EXTRUDE7_DRAFT)


with BuildPart() as part_1:
    add(part.part)

    # Cut-Extrude7: cut by cut_extrude7_tool
    add(cut_extrude7_tool.part, mode=Mode.SUBTRACT)


with BuildPart() as cut_extrude7_profile_2_tool:
    # Sketch15 → Cut-Extrude7 profile 2 (with draft: the straight prism first)
    with BuildSketch(Plane(origin=(0, -8.89, 0), x_dir=(-1, 0, 0), z_dir=(0, -1, 0))):
        with Locations((-2.726054499, -22.86)):
            Circle(SKETCH15_R)
    extrude(amount=-CUT_EXTRUDE7_PROFILE_2_DEPTH)
    # Cut-Extrude7 profile 2: the draft: its side faces are tilted about the plane it starts from
    cut_extrude7_profile_2_sides = [cut_extrude7_profile_2_tool.faces().sort_by_distance(p)[0] for p in [
        (4.377054499, -5.715, 22.86),
    ]]
    draft(cut_extrude7_profile_2_sides, Plane(origin=(0, -8.89, 0), x_dir=(-1, 0, 0), z_dir=(0, -1, 0)), CUT_EXTRUDE7_PROFILE_2_DRAFT)


with BuildPart() as part_2:
    add(part_1.part)

    # Cut-Extrude7 profile 2: cut by cut_extrude7_profile_2_tool
    add(cut_extrude7_profile_2_tool.part, mode=Mode.SUBTRACT)


with BuildPart() as cut_extrude7_profile_3_tool:
    # Sketch15 → Cut-Extrude7 profile 3 (with draft: the straight prism first)
    with BuildSketch(Plane(origin=(0, -8.89, 0), x_dir=(-1, 0, 0), z_dir=(0, -1, 0))):
        with Locations((-2.726054499, 22.86)):
            Circle(SKETCH15_R)
    extrude(amount=-CUT_EXTRUDE7_PROFILE_3_DEPTH)
    # Cut-Extrude7 profile 3: the draft: its side faces are tilted about the plane it starts from
    cut_extrude7_profile_3_sides = [cut_extrude7_profile_3_tool.faces().sort_by_distance(p)[0] for p in [
        (4.377054499, -5.715, -22.86),
    ]]
    draft(cut_extrude7_profile_3_sides, Plane(origin=(0, -8.89, 0), x_dir=(-1, 0, 0), z_dir=(0, -1, 0)), CUT_EXTRUDE7_PROFILE_3_DRAFT)


with BuildPart() as part_3:
    add(part_2.part)

    # Cut-Extrude7 profile 3: cut by cut_extrude7_profile_3_tool
    add(cut_extrude7_profile_3_tool.part, mode=Mode.SUBTRACT)


with BuildPart() as cut_extrude7_profile_4_tool:
    # Sketch15 → Cut-Extrude7 profile 4 (with draft: the straight prism first)
    with BuildSketch(Plane(origin=(0, -8.89, 0), x_dir=(-1, 0, 0), z_dir=(0, -1, 0))):
        with Locations((-48.446054499, 22.86)):
            Circle(SKETCH15_R)
    extrude(amount=-CUT_EXTRUDE7_PROFILE_4_DEPTH)
    # Cut-Extrude7 profile 4: the draft: its side faces are tilted about the plane it starts from
    cut_extrude7_profile_4_sides = [cut_extrude7_profile_4_tool.faces().sort_by_distance(p)[0] for p in [
        (50.097054499, -5.715, -22.86),
    ]]
    draft(cut_extrude7_profile_4_sides, Plane(origin=(0, -8.89, 0), x_dir=(-1, 0, 0), z_dir=(0, -1, 0)), CUT_EXTRUDE7_PROFILE_4_DRAFT)


with BuildPart() as part_4:
    add(part_3.part)

    # Cut-Extrude7 profile 4: cut by cut_extrude7_profile_4_tool
    add(cut_extrude7_profile_4_tool.part, mode=Mode.SUBTRACT)


solid = Compound([body_2.part, part_4.part])
